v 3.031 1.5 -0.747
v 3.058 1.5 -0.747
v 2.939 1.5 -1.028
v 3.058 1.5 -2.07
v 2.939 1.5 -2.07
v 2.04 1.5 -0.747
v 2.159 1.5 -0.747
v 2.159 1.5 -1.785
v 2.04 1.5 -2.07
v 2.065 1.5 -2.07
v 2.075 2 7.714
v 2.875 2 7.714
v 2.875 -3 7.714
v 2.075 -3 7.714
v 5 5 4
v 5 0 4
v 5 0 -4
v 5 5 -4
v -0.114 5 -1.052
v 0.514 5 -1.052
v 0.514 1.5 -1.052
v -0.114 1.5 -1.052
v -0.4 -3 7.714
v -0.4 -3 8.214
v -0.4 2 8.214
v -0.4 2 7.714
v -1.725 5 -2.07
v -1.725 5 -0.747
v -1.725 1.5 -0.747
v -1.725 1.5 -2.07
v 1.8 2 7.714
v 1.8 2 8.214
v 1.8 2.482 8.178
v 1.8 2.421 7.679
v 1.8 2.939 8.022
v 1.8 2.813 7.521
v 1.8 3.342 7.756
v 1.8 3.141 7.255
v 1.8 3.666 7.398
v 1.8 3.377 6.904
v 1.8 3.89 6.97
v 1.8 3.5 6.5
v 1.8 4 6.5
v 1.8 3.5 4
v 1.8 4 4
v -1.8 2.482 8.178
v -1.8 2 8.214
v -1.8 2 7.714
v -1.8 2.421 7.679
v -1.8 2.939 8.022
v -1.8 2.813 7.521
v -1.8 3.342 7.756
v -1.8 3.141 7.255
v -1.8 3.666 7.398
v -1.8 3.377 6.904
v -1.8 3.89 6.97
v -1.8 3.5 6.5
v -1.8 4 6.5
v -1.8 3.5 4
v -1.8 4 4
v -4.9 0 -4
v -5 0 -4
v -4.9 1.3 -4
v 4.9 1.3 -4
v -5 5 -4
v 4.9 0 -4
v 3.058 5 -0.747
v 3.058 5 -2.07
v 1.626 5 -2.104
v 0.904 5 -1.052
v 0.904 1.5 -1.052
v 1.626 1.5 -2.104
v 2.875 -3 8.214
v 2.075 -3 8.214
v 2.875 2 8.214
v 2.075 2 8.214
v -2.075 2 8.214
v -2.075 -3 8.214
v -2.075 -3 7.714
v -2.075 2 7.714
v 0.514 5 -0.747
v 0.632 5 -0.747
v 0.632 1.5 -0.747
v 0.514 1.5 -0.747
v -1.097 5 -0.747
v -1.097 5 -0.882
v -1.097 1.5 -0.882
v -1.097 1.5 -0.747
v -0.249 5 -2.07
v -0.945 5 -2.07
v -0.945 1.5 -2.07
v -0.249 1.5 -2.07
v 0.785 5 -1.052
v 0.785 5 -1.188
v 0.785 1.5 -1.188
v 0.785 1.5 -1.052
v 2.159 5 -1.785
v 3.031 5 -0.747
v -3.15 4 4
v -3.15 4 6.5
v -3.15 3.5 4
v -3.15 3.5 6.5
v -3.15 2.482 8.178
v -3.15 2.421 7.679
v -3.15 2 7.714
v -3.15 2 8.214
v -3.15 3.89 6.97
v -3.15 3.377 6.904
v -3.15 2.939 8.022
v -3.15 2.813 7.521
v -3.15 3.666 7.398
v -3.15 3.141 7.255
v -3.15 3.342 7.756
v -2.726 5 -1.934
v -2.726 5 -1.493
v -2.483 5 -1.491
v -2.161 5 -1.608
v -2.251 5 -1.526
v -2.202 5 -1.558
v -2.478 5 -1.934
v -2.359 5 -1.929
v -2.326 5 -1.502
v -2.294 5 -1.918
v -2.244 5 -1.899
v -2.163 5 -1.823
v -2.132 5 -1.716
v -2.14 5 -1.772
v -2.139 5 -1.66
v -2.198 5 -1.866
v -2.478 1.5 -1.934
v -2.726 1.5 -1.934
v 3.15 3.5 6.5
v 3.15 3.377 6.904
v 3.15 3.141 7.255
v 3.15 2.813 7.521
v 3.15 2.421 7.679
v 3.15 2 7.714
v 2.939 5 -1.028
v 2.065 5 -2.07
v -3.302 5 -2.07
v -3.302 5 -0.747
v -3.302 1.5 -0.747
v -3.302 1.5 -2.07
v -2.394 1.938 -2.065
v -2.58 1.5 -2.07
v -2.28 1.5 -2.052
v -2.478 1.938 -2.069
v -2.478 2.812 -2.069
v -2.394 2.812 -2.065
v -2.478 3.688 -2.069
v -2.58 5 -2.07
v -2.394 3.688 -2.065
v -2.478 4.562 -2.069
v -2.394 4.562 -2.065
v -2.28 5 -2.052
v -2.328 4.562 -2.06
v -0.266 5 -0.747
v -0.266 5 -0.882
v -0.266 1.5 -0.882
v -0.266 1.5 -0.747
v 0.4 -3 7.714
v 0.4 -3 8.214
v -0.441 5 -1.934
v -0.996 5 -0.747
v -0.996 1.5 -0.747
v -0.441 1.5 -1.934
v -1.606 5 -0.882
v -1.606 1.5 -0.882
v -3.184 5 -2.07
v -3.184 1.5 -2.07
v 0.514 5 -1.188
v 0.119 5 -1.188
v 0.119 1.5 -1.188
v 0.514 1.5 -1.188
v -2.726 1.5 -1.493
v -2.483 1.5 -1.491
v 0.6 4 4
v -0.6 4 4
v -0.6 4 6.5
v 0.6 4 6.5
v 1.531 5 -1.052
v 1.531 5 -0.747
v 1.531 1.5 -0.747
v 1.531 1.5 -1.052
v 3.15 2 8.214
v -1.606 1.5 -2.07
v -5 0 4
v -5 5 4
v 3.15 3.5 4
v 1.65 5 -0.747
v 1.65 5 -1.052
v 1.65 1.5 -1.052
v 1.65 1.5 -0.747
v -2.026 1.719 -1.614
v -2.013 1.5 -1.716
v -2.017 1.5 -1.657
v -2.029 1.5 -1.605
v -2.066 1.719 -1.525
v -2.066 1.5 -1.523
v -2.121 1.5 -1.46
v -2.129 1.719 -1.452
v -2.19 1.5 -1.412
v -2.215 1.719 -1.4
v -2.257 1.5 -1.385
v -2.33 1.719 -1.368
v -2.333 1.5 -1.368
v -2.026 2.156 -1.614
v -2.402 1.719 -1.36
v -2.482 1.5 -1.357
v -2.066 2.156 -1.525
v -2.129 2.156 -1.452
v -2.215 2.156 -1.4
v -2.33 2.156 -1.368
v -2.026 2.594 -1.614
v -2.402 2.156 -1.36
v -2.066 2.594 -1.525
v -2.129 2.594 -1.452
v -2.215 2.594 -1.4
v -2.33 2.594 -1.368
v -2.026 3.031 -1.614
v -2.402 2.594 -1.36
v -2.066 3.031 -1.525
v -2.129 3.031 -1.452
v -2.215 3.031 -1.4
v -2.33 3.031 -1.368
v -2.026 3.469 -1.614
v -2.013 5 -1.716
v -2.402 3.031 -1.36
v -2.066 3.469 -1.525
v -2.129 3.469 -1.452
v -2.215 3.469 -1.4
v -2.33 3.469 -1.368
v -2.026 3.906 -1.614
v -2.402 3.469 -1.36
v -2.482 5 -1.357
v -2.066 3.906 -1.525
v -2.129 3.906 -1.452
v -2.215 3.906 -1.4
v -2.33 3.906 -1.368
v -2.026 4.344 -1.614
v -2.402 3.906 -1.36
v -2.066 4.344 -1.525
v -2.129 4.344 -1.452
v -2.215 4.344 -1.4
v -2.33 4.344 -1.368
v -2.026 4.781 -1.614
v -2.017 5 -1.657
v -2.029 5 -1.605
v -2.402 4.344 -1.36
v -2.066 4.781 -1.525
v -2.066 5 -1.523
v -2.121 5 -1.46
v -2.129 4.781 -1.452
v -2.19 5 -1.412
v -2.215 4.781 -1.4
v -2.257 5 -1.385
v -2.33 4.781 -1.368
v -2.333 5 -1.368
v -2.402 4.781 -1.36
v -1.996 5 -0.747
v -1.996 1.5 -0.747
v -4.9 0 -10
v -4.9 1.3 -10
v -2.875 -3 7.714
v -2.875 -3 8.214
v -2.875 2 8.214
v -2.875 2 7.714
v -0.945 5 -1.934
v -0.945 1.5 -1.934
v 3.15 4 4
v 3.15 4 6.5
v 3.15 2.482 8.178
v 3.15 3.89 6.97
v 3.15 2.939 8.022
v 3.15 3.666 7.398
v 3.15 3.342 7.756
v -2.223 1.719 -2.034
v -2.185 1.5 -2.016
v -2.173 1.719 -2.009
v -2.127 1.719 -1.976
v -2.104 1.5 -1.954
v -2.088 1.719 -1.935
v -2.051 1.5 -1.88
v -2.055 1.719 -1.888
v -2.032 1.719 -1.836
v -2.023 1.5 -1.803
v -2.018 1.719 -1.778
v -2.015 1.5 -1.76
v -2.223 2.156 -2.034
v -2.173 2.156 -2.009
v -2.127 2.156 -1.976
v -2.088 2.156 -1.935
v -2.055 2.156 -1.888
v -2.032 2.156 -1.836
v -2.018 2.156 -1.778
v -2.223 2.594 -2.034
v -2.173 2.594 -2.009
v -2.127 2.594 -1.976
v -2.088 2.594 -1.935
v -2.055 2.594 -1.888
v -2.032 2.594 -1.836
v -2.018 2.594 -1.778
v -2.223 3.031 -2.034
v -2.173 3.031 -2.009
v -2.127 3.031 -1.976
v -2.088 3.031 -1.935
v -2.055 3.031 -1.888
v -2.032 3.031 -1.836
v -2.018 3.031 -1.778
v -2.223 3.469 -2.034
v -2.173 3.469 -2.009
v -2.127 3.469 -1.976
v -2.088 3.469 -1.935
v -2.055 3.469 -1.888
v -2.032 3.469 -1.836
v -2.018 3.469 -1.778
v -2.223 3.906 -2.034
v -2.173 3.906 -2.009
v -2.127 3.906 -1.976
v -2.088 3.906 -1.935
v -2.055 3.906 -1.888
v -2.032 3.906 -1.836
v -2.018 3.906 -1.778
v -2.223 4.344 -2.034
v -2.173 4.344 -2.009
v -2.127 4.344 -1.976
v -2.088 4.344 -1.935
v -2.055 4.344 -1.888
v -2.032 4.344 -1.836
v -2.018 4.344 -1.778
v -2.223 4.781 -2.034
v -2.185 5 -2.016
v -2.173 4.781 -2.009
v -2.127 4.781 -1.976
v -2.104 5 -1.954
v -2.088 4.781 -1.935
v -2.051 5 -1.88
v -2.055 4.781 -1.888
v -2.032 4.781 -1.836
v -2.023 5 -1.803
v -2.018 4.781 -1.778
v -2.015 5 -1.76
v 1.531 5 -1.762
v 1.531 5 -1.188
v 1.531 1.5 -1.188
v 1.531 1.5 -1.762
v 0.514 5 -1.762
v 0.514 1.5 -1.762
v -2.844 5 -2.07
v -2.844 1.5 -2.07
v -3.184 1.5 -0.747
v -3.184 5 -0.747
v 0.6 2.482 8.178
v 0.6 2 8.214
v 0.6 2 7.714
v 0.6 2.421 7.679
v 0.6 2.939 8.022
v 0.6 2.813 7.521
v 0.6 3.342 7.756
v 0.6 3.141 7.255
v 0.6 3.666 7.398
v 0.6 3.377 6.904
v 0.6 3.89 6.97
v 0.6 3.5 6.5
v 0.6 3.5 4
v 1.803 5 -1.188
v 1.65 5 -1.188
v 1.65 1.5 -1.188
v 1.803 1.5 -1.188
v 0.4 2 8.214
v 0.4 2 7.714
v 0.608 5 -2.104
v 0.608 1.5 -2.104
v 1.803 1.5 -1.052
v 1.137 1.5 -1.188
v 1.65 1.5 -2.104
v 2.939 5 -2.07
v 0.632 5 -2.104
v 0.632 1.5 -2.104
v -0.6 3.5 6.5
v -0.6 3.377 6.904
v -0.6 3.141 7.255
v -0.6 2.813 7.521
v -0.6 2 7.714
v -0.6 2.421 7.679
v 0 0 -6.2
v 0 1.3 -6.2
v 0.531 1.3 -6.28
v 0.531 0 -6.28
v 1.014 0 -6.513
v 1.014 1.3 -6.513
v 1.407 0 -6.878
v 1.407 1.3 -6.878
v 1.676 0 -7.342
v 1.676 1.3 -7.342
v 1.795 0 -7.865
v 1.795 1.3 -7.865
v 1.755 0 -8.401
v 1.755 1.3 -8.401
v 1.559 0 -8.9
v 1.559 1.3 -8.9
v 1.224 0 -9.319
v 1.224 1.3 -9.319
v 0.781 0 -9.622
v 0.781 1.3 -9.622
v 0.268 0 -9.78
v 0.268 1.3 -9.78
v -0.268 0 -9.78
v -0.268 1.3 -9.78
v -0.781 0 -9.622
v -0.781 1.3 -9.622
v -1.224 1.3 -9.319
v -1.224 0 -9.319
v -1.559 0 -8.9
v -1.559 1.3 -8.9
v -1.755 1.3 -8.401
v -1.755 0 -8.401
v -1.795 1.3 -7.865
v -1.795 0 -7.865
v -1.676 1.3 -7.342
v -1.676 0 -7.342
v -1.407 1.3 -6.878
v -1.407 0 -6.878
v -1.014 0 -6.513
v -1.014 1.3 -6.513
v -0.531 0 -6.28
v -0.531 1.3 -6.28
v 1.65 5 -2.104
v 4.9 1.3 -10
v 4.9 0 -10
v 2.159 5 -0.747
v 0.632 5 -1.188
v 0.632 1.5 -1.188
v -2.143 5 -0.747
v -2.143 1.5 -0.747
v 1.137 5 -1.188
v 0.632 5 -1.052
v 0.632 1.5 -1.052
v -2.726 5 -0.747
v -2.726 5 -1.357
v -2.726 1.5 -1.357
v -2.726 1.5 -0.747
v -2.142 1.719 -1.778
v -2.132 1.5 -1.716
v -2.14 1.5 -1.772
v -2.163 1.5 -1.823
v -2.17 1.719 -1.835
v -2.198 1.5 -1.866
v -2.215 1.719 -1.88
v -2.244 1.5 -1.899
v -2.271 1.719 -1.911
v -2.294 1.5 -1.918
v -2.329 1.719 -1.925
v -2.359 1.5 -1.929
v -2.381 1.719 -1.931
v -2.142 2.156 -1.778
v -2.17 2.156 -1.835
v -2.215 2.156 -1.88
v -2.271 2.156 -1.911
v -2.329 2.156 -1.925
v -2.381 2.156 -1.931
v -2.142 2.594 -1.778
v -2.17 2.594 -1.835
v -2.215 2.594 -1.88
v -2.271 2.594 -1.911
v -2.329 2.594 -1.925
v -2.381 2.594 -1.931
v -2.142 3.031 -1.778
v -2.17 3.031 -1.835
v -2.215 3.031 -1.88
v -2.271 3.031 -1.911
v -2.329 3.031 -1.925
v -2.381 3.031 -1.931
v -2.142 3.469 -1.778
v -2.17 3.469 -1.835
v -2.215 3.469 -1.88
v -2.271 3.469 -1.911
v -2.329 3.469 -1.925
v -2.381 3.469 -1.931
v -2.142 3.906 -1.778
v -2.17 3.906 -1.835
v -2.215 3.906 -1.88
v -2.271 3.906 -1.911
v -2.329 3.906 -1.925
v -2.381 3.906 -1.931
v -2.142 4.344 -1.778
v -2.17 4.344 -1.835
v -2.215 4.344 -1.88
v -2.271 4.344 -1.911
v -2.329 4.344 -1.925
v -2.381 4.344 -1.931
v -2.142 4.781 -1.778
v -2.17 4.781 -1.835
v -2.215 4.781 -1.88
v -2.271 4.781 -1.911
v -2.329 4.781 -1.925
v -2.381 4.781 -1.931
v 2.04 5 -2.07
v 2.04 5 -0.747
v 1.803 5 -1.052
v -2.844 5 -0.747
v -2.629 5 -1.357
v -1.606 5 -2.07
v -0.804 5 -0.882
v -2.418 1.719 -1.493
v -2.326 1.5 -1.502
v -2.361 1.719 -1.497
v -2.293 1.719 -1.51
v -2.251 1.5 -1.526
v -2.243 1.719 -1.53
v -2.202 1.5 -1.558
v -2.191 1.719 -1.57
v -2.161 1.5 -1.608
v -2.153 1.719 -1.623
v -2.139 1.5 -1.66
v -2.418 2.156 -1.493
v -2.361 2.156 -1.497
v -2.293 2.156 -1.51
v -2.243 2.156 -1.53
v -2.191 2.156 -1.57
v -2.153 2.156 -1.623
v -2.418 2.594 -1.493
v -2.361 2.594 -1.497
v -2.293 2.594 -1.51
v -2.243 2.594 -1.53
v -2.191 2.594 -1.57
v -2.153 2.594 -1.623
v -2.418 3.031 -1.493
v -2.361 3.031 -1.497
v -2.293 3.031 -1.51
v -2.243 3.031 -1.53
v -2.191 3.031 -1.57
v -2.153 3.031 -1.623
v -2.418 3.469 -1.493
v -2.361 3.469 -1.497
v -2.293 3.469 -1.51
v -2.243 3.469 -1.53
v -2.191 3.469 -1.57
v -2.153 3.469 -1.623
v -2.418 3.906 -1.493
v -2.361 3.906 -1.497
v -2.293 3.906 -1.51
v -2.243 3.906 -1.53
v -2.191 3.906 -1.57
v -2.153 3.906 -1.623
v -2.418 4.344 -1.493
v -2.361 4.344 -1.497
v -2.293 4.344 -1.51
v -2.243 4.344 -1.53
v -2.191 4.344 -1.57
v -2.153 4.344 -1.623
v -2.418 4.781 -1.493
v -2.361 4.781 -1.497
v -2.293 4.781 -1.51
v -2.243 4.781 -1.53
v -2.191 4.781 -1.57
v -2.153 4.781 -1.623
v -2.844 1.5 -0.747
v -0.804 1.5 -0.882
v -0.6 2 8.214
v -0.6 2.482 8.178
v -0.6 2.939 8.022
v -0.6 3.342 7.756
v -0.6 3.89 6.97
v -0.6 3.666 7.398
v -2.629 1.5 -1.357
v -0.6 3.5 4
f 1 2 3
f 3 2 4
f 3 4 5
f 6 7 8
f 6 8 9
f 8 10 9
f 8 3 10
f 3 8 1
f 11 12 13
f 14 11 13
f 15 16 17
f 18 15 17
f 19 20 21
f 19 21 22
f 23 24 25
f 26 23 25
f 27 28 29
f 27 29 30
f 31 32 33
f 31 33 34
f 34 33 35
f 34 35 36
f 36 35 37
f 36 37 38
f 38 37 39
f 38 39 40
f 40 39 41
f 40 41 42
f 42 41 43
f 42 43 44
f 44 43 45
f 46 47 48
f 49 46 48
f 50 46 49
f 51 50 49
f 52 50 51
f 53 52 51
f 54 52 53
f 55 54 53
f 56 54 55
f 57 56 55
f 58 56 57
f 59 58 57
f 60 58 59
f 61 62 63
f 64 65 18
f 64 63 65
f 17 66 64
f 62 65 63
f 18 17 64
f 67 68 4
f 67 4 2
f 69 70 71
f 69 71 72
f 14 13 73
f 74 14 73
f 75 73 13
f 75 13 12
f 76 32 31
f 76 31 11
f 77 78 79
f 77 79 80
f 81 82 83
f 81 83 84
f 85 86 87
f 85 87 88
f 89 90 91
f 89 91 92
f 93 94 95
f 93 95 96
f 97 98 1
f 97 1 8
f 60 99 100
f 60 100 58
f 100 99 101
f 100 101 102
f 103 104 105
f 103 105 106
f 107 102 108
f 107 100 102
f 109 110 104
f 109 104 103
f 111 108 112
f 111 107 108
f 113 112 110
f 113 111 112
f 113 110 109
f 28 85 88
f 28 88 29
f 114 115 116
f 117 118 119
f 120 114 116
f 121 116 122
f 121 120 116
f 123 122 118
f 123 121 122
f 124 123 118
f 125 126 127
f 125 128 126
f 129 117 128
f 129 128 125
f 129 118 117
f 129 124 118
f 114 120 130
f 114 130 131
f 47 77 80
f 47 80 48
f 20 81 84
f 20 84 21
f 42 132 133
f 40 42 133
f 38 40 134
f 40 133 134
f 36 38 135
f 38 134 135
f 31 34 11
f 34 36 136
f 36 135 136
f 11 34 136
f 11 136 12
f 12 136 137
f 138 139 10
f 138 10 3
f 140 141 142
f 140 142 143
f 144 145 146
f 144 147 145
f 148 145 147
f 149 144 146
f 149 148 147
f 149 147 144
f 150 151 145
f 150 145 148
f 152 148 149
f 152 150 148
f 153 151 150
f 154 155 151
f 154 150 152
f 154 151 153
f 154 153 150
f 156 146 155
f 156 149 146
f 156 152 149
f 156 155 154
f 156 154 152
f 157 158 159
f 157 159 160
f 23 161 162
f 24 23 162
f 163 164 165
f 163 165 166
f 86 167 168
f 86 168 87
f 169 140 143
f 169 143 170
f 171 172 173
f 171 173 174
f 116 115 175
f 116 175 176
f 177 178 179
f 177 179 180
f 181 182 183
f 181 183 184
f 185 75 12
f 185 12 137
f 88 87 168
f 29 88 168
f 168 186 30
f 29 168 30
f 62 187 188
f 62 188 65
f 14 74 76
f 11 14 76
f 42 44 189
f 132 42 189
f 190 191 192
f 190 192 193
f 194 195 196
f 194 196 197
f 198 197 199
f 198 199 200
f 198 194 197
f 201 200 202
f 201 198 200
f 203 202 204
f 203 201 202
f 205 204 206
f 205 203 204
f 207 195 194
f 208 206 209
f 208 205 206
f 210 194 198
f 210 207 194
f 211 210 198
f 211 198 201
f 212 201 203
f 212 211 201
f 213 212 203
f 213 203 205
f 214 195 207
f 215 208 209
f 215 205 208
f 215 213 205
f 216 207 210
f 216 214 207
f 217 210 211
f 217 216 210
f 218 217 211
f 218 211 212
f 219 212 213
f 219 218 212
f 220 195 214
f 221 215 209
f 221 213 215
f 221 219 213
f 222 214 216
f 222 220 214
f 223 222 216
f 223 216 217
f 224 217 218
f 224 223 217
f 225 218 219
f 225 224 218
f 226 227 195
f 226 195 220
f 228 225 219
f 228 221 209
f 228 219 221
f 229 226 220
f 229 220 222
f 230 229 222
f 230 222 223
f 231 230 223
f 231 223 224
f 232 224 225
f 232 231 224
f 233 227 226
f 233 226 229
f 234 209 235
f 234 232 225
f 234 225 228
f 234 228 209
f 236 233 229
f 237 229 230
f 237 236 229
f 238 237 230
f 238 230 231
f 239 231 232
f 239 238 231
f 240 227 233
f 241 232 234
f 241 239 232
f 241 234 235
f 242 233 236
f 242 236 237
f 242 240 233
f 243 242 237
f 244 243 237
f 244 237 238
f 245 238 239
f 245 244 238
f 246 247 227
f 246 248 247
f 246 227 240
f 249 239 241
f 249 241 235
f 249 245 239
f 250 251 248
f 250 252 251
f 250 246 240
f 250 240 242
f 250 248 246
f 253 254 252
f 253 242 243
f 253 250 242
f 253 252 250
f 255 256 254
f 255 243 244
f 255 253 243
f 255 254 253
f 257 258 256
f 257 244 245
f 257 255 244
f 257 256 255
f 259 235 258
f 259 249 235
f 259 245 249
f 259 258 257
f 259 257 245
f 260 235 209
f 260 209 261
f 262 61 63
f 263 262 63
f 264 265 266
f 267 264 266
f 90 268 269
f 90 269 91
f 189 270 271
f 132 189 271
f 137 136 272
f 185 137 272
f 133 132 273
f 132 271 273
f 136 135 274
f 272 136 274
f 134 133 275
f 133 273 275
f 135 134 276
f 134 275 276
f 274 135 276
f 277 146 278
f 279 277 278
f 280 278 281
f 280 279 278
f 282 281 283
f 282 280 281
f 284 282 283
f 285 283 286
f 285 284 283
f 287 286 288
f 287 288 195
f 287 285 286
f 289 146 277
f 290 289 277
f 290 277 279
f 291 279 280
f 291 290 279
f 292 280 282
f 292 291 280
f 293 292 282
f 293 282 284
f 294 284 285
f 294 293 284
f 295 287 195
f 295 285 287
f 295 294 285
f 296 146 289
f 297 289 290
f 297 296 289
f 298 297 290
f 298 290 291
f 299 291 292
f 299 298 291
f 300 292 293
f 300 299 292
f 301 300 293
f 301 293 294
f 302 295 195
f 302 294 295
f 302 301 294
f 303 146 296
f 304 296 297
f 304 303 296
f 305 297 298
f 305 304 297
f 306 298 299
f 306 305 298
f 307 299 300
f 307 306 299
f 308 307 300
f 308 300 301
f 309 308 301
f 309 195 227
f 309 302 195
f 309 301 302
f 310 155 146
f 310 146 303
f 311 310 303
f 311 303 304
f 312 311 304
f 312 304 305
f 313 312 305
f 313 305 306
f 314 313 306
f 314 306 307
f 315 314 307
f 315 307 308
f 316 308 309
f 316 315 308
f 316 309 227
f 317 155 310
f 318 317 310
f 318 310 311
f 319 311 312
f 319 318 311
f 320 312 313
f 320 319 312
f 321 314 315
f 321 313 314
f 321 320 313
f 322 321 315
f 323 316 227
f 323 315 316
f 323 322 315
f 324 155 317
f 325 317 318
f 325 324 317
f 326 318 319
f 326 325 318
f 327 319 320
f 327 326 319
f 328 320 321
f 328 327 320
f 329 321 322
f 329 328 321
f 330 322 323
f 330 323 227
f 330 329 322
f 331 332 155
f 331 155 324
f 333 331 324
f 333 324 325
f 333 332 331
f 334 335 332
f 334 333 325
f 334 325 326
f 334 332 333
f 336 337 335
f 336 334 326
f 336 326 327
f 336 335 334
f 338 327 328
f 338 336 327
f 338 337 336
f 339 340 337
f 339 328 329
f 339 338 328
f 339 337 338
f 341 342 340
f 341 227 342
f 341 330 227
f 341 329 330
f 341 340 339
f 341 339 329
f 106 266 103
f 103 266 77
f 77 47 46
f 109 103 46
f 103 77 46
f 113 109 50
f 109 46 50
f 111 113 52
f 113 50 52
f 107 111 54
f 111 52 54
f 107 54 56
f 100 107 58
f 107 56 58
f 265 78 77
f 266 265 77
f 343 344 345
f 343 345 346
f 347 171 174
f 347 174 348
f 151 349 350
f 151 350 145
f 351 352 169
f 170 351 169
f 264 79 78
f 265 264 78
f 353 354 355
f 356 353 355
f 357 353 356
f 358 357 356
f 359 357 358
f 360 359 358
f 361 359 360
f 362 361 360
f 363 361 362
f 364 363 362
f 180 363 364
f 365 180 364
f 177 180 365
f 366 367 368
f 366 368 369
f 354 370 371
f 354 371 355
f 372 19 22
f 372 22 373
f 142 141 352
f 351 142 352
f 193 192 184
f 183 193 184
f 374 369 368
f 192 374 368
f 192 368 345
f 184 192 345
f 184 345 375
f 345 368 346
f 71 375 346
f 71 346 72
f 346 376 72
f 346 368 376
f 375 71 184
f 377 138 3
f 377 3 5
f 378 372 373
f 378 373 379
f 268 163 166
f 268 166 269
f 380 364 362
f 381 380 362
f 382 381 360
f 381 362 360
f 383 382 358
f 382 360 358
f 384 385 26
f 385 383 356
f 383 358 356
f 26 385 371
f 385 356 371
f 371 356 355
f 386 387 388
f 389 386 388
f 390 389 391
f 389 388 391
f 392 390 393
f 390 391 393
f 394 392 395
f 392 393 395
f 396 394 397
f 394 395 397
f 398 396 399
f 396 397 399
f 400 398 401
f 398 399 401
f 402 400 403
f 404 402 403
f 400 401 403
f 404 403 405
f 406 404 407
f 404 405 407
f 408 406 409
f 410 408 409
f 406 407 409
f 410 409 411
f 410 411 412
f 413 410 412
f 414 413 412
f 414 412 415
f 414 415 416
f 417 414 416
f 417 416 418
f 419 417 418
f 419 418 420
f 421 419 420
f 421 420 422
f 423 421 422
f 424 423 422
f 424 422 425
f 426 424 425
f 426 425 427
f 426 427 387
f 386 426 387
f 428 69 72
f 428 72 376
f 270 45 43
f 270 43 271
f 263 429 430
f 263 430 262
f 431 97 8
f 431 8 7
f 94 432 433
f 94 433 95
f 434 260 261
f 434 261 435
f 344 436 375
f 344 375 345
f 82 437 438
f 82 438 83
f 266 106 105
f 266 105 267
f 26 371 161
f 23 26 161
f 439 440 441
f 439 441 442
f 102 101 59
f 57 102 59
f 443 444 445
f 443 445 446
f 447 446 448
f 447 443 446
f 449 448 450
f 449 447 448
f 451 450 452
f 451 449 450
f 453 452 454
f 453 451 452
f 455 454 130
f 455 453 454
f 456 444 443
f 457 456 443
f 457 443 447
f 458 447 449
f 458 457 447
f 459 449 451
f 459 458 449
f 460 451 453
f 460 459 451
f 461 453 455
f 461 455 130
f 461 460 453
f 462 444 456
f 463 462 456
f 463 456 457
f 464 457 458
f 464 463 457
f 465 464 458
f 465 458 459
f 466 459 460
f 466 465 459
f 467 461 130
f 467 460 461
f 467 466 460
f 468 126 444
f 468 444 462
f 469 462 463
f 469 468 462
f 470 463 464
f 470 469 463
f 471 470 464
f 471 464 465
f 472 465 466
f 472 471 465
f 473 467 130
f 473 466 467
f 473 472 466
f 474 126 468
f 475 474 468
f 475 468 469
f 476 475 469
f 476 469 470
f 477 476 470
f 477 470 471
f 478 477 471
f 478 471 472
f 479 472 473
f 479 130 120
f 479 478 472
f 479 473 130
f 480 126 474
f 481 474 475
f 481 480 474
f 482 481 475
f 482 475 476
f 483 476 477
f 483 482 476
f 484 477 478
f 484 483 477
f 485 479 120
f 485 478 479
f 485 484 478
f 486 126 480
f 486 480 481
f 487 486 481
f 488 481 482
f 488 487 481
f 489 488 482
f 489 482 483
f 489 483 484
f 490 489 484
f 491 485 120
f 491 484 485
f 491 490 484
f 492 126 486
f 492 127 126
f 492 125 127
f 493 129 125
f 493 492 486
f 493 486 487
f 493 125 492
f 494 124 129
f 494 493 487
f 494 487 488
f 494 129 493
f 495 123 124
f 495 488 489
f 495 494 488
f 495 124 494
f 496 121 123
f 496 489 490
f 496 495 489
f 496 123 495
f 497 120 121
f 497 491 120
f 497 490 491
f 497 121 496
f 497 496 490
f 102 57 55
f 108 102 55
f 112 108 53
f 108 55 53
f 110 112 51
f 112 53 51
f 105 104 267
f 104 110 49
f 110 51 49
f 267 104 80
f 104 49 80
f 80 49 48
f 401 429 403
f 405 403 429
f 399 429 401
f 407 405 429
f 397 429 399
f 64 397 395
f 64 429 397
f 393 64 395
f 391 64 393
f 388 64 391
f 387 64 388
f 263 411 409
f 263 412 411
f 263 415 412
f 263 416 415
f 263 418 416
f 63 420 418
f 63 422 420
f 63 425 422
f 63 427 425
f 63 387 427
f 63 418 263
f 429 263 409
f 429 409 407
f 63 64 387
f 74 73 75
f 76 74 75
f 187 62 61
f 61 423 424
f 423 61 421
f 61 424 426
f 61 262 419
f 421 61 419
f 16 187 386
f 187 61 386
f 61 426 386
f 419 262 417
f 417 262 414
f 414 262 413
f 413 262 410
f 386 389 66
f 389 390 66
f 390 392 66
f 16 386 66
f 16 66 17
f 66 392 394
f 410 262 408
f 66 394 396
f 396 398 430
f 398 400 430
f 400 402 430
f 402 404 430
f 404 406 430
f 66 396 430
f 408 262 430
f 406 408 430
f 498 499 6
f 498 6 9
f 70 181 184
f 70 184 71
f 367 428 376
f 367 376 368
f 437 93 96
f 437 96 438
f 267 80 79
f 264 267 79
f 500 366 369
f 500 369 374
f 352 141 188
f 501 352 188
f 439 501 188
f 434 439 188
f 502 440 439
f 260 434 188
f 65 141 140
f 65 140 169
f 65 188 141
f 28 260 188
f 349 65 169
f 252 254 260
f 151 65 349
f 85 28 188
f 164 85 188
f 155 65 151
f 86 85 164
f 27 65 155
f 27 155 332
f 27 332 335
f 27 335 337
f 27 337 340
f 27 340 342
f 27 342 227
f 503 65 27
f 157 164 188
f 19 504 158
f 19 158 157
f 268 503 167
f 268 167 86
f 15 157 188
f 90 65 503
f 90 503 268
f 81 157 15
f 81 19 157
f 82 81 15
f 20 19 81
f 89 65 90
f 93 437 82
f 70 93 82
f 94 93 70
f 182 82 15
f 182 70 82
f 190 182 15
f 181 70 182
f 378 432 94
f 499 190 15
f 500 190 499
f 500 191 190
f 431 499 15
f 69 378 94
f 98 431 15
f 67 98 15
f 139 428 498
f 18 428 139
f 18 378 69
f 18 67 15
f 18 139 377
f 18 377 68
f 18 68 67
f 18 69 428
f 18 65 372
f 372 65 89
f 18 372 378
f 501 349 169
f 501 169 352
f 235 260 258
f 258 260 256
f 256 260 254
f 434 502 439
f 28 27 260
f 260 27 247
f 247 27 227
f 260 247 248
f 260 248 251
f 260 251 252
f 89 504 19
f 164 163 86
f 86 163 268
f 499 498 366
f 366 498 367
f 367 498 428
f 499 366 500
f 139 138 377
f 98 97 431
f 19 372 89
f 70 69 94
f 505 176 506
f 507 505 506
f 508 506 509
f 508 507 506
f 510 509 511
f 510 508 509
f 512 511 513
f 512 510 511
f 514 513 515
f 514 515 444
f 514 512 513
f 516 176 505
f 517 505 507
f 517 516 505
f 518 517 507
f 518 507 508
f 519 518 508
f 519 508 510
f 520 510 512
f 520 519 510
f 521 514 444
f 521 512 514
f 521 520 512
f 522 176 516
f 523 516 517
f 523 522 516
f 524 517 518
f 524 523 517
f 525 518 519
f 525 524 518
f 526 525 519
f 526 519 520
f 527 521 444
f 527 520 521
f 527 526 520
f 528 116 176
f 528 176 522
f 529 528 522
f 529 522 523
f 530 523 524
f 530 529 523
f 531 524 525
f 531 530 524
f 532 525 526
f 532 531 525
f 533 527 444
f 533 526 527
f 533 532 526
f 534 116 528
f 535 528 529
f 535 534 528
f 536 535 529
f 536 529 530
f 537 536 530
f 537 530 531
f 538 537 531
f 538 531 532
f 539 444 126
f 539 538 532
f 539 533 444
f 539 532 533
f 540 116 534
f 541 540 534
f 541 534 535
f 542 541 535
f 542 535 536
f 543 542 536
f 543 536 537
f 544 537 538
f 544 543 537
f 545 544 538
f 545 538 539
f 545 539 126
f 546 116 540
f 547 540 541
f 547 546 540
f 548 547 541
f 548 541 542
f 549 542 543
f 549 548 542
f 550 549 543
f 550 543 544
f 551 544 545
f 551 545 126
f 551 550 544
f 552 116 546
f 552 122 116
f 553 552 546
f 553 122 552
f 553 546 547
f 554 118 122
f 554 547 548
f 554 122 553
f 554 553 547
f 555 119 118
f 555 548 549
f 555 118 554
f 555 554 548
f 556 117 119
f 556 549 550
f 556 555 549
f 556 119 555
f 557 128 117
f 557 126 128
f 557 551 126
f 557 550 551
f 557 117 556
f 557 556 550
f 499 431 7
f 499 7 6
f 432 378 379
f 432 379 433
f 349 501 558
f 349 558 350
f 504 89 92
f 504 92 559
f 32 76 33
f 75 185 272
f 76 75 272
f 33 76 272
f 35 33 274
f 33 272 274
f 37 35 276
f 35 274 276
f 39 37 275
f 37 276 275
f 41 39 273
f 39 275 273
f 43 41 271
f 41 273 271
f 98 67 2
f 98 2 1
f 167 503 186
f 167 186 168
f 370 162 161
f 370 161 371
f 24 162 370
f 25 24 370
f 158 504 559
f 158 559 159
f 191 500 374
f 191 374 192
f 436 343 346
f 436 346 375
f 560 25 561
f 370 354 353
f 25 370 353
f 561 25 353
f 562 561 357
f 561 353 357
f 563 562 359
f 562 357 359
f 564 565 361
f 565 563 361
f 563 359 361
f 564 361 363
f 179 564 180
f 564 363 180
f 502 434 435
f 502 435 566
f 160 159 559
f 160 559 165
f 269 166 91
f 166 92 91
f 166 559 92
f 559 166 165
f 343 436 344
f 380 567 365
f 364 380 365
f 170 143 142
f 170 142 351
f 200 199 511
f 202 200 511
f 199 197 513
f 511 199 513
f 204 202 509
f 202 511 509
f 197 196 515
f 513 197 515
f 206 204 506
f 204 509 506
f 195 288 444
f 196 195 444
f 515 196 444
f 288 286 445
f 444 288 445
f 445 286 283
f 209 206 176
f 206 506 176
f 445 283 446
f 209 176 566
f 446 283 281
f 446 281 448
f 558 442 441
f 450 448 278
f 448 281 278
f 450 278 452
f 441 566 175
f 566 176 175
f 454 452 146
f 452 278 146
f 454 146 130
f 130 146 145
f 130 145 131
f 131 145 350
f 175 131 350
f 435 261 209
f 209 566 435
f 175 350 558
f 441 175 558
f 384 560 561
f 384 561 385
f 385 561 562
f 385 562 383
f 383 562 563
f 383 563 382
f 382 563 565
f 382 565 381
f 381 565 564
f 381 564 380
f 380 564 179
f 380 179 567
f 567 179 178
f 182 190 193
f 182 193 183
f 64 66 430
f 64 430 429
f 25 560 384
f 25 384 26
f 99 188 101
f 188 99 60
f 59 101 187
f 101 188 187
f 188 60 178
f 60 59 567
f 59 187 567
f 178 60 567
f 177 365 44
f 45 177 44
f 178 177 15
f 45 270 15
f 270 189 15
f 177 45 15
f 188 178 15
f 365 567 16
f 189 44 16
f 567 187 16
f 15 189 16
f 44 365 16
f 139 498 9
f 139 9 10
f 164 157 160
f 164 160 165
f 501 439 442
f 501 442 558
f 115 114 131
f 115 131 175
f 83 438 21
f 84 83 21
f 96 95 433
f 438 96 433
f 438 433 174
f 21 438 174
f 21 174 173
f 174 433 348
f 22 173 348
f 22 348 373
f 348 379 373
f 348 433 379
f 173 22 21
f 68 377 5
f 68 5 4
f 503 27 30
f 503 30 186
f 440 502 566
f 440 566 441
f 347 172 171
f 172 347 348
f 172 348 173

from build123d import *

# Parameters (mm, degrees)
SKETCH1_W           = 10
SKETCH1_H           = 8
BOSS_EXTRUDE1_DEPTH = 5
SKETCH2_W           = 9.8
SKETCH2_H           = 1.3
BOSS_EXTRUDE2_DEPTH = 6
SKETCH3_W           = 6.3
SKETCH3_H           = 0.5
BOSS_EXTRUDE3_DEPTH = 2.5
BOSS_EXTRUDE4_START = -6.3
BOSS_EXTRUDE4_DEPTH = 6.3
SKETCH5_W           = 1.2
SKETCH5_H           = 5
CUT_EXTRUDE1_DEPTH  = 14.190905958
SKETCH6_W           = 0.275
SKETCH6_H           = 5
SKETCH6_W_2         = 0.2
CUT_EXTRUDE2_DEPTH  = 3.5
SKETCH7_R           = 1.8
CUT_EXTRUDE3_DEPTH  = 3.5
SKETCH8_W           = 0.11872329
SKETCH8_H           = 1.322916667
CUT_EXTRUDE4_DEPTH  = 3.5


with BuildPart() as part:
    # Sketch1 → Boss-Extrude1 (new body)
    with BuildSketch(Plane(origin=(0, 0, 0), x_dir=(1, 0, 0), z_dir=(0, 1, 0))):
        Rectangle(SKETCH1_W, SKETCH1_H)
    extrude(amount=BOSS_EXTRUDE1_DEPTH)

    # Sketch2 → Boss-Extrude2 (add)
    with BuildSketch(Plane(origin=(0, 0, -4), x_dir=(-1, 0, 0), z_dir=(0, 0, -1))):
        with Locations((0, 0.65)):
            Rectangle(SKETCH2_W, SKETCH2_H)
    extrude(amount=BOSS_EXTRUDE2_DEPTH)

    # Sketch3 → Boss-Extrude3 (add)
    with BuildSketch(Plane.XY.offset(4)):
        with Locations((0, 3.75)):
            Rectangle(SKETCH3_W, SKETCH3_H)
    extrude(amount=BOSS_EXTRUDE3_DEPTH)

    # Sketch4 → Boss-Extrude4 (add)
    with BuildSketch(Plane.ZY.offset(3.15).offset(BOSS_EXTRUDE4_START)):
        with BuildLine():
            Line((7.714456463, 2), (7.714456463, -3))
            Line((7.714456463, -3), (8.214456463, -3))
            Line((8.214456463, -3), (8.214456463, 2))
            ThreePointArc((8.214456463, 2), (7.756212161, 3.342020289), (6.5, 4))
            Line((6.5, 4), (6.5, 3.5))
            ThreePointArc((6.5, 3.5), (7.40002744, 2.98706126), (7.714456463, 2))
        make_face()
    extrude(amount=BOSS_EXTRUDE4_DEPTH)

    # Sketch5 → Cut-Extrude1 (cut, through all)
    with BuildSketch(Plane(origin=(0, 4, 0), x_dir=(1, 0, 0), z_dir=(0, 1, 0))):
        with Locations((-1.2, -6.5)):
            Rectangle(SKETCH5_W, SKETCH5_H)
        with Locations((1.2, -6.5)):
            Rectangle(SKETCH5_W, SKETCH5_H)
    extrude(amount=-CUT_EXTRUDE1_DEPTH, mode=Mode.SUBTRACT)

    # Sketch6 → Cut-Extrude2 (cut)
    with BuildSketch(Plane.XY.offset(8.214456463)):
        with Locations((-3.0125, -0.5)):
            Rectangle(SKETCH6_W, SKETCH6_H)
        with Locations((-1.9375, -0.5)):
            Rectangle(SKETCH6_W, SKETCH6_H)
        with Locations((-0.5, -0.5)):
            Rectangle(SKETCH6_W_2, SKETCH6_H)
        with Locations((0.5, -0.5)):
            Rectangle(SKETCH6_W_2, SKETCH6_H)
        with Locations((1.9375, -0.5)):
            Rectangle(SKETCH6_W, SKETCH6_H)
        with Locations((3.0125, -0.5)):
            Rectangle(SKETCH6_W, SKETCH6_H)
    extrude(amount=-CUT_EXTRUDE2_DEPTH, mode=Mode.SUBTRACT)

    # Sketch7 → Cut-Extrude3 (cut)
    with BuildSketch(Plane(origin=(0, 1.3, 0), x_dir=(1, 0, 0), z_dir=(0, 1, 0))):
        with Locations(Location((0, 8, 0), (0, 0, 270))):
            Circle(SKETCH7_R)
    extrude(amount=-CUT_EXTRUDE3_DEPTH, mode=Mode.SUBTRACT)

    # Sketch8 → Cut-Extrude4 (cut)
    # profile 1 of 7: a face of its own
    with BuildSketch(Plane(origin=(0, 5, 0), x_dir=(1, 0, 0), z_dir=(0, 1, 0))):
        with Locations((-3.24297038, 1.408129396)):
            Rectangle(SKETCH8_W, SKETCH8_H)
    # profile 2 of 7: a face of its own
    with BuildSketch(Plane(origin=(0, 5, 0), x_dir=(1, 0, 0), z_dir=(0, 1, 0))):
        with BuildLine():
            Line((-2.844399333, 2.069587729), (-2.579656995, 2.069587729))
            add(Edge.make_bspline(
                [(-2.579656995, 2.069587729), (-2.561989961, 2.069528921), (-2.5280673, 2.069416003), (-2.479469665, 2.068786385), (-2.435311804, 2.066981792), (-2.395616805, 2.065428845), (-2.360385397, 2.06259707), (-2.329509546, 2.059890516), (-2.303131458, 2.056347495), (-2.287163532, 2.053057052), (-2.279933688, 2.051567229)],
                knots=[0, 0, 0, 0, 1.410062039, 2.707475311, 3.878576406, 4.937260626, 5.877586885, 6.699081471, 7.410979367, 8, 8, 8, 8], degree=3))
            add(Edge.make_bspline(
                [(-2.279933688, 2.051567229), (-2.270254994, 2.049175863), (-2.251104078, 2.044444144), (-2.22353069, 2.034443045), (-2.19725593, 2.022869555), (-2.172388943, 2.009276125), (-2.149054284, 1.993561849), (-2.127011351, 1.975998005), (-2.106160119, 1.956680698), (-2.087343849, 1.935122886), (-2.069602005, 1.91250611), (-2.054638446, 1.88804963), (-2.04173945, 1.862475184), (-2.031469641, 1.835522678), (-2.023200288, 1.807453496), (-2.017369537, 1.778013385), (-2.013872808, 1.747336469), (-2.013516809, 1.726412498), (-2.013336299, 1.715802923)],
                knots=[0, 0, 0, 0, 1.027469482, 2.033020251, 3.019912614, 3.986113645, 4.951240523, 5.91722682, 6.890402269, 7.87763091, 8.8651537, 9.85103654, 10.82876324, 11.815024772, 12.821070561, 13.842952187, 14.906261191, 16, 16, 16, 16], degree=3))
            add(Edge.make_bspline(
                [(-2.013336299, 1.715802923), (-2.013891545, 1.698175964), (-2.014974974, 1.663781201), (-2.025076427, 1.613865332), (-2.041622909, 1.567302704), (-2.064423676, 1.524151945), (-2.093459609, 1.485254172), (-2.128356182, 1.451088732), (-2.169132862, 1.422498646), (-2.207092753, 1.402672734), (-2.240624608, 1.389975415), (-2.268229461, 1.381041434), (-2.298341682, 1.374138846), (-2.330672758, 1.367955106), (-2.365357235, 1.363286459), (-2.402311982, 1.359867062), (-2.441563355, 1.357729966), (-2.468527824, 1.357411708), (-2.482399299, 1.357247985)],
                knots=[0, 0, 0, 0, 1.260483769, 2.459530307, 3.627416485, 4.787058657, 5.939039949, 7.08810263, 8.267026773, 9.491475466, 10.141966685, 10.831826277, 11.566392101, 12.351337768, 13.187381173, 14.07005841, 15.007169909, 16, 16, 16, 16], degree=3))
            Line((-2.482399299, 1.357247985), (-1.996375829, 0.746671062))
            Line((-1.996375829, 0.746671062), (-2.143189898, 0.746671062))
            Line((-2.143189898, 0.746671062), (-2.629213369, 1.357247985))
            Line((-2.629213369, 1.357247985), (-2.725676042, 1.357247985))
            Line((-2.725676042, 1.357247985), (-2.725676042, 0.746671062))
            Line((-2.725676042, 0.746671062), (-2.844399333, 0.746671062))
            Line((-2.844399333, 0.746671062), (-2.844399333, 2.069587729))
        make_face()
        with BuildLine():
            Line((-2.725676042, 1.933903968), (-2.725676042, 1.492931746))
            Line((-2.725676042, 1.492931746), (-2.483459329, 1.491076694))
            add(Edge.make_bspline(
                [(-2.483459329, 1.491076694), (-2.472150266, 1.491071691), (-2.450230083, 1.491061994), (-2.418517629, 1.492571546), (-2.388990087, 1.494288812), (-2.361760398, 1.496915499), (-2.336816398, 1.500300681), (-2.314170554, 1.504535143), (-2.2937859, 1.509468511), (-2.27001175, 1.517104245), (-2.243464014, 1.529201758), (-2.214612539, 1.546802408), (-2.190043203, 1.56894014), (-2.169285559, 1.594254512), (-2.152605685, 1.622087261), (-2.140846069, 1.652104758), (-2.133383896, 1.683549201), (-2.132503761, 1.705161164), (-2.132059589, 1.71606793)],
                knots=[0, 0, 0, 0, 1.146690395, 2.22261258, 3.21895312, 4.145990853, 4.996080663, 5.770904154, 6.481378293, 7.121626537, 8.300444488, 9.431385265, 10.535395872, 11.636531494, 12.74115979, 13.810798291, 14.895190096, 16, 16, 16, 16], degree=3))
            add(Edge.make_bspline(
                [(-2.132059589, 1.71606793), (-2.132513962, 1.726706665), (-2.133414364, 1.747788755), (-2.140765536, 1.778652745), (-2.153196939, 1.807782217), (-2.169949689, 1.835058675), (-2.190360084, 1.859818283), (-2.21429271, 1.881002772), (-2.241093185, 1.898483969), (-2.26614212, 1.909654821), (-2.288531242, 1.916503694), (-2.307970429, 1.921323331), (-2.329935184, 1.925195496), (-2.354532158, 1.928297947), (-2.381656346, 1.930964548), (-2.411444896, 1.932760608), (-2.443700167, 1.933824181), (-2.466056299, 1.933876754), (-2.477629167, 1.933903968)],
                knots=[0, 0, 0, 0, 1.101028733, 2.181837193, 3.264309656, 4.369019818, 5.486613113, 6.575447106, 7.666700264, 8.788928104, 9.402425223, 10.0903467, 10.862060571, 11.710948788, 12.657782767, 13.684531032, 14.801375019, 16, 16, 16, 16], degree=3))
            Line((-2.477629167, 1.933903968), (-2.725676042, 1.933903968))
        make_face(mode=Mode.SUBTRACT)
    # profile 3 of 7: a face of its own
    with BuildSketch(Plane(origin=(0, 5, 0), x_dir=(1, 0, 0), z_dir=(0, 1, 0))):
        Polygon((-1.725008307, 2.069587729), (-1.606285017, 2.069587729), (-1.606285017, 0.882354823), (-1.097470914, 0.882354823), (-1.097470914, 0.746671062), (-1.725008307, 0.746671062), align=None)
    # profile 4 of 7: a face of its own
    with BuildSketch(Plane(origin=(0, 5, 0), x_dir=(1, 0, 0), z_dir=(0, 1, 0))):
        Polygon((-0.944826683, 1.933903968), (-0.944826683, 2.069587729), (-0.24944741, 2.069587729), (-0.80437279, 0.882354823), (-0.26640788, 0.882354823), (-0.26640788, 0.746671062), (-0.995708093, 0.746671062), (-0.440782713, 1.933903968), align=None)
    # profile 5 of 7: a face of its own
    with BuildSketch(Plane(origin=(0, 5, 0), x_dir=(1, 0, 0), z_dir=(0, 1, 0))):
        Polygon((0.608381366, 2.103508669), (0.632497035, 2.103508669), (0.632497035, 1.187643284), (0.785141265, 1.187643284), (0.785141265, 1.051959524), (0.632497035, 1.051959524), (0.632497035, 0.746671062), (0.513773744, 0.746671062), (0.513773744, 1.051959524), (-0.113763649, 1.051959524), align=None)
        Polygon((0.513773744, 1.187643284), (0.513773744, 1.762179208), (0.119442815, 1.187643284), align=None, mode=Mode.SUBTRACT)
    # profile 6 of 7: a face of its own
    with BuildSketch(Plane(origin=(0, 5, 0), x_dir=(1, 0, 0), z_dir=(0, 1, 0))):
        Polygon((1.626009571, 2.103508669), (1.65012524, 2.103508669), (1.65012524, 1.187643284), (1.802769471, 1.187643284), (1.802769471, 1.051959524), (1.65012524, 1.051959524), (1.65012524, 0.746671062), (1.531401949, 0.746671062), (1.531401949, 1.051959524), (0.903864556, 1.051959524), align=None)
        Polygon((1.531401949, 1.187643284), (1.531401949, 1.762179208), (1.13707102, 1.187643284), align=None, mode=Mode.SUBTRACT)
    # profile 7 of 7: a face of its own
    with BuildSketch(Plane(origin=(0, 5, 0), x_dir=(1, 0, 0), z_dir=(0, 1, 0))):
        Polygon((2.040216052, 0.746671062), (2.040216052, 2.069587729), (2.065126742, 2.069587729), (2.939120966, 1.02837387), (2.939120966, 2.069587729), (3.057844257, 2.069587729), (3.057844257, 0.746671062), (3.030813508, 0.746671062), (2.158939342, 1.785499855), (2.158939342, 0.746671062), align=None)
    extrude(amount=-CUT_EXTRUDE4_DEPTH, mode=Mode.SUBTRACT)


solid = part.part
